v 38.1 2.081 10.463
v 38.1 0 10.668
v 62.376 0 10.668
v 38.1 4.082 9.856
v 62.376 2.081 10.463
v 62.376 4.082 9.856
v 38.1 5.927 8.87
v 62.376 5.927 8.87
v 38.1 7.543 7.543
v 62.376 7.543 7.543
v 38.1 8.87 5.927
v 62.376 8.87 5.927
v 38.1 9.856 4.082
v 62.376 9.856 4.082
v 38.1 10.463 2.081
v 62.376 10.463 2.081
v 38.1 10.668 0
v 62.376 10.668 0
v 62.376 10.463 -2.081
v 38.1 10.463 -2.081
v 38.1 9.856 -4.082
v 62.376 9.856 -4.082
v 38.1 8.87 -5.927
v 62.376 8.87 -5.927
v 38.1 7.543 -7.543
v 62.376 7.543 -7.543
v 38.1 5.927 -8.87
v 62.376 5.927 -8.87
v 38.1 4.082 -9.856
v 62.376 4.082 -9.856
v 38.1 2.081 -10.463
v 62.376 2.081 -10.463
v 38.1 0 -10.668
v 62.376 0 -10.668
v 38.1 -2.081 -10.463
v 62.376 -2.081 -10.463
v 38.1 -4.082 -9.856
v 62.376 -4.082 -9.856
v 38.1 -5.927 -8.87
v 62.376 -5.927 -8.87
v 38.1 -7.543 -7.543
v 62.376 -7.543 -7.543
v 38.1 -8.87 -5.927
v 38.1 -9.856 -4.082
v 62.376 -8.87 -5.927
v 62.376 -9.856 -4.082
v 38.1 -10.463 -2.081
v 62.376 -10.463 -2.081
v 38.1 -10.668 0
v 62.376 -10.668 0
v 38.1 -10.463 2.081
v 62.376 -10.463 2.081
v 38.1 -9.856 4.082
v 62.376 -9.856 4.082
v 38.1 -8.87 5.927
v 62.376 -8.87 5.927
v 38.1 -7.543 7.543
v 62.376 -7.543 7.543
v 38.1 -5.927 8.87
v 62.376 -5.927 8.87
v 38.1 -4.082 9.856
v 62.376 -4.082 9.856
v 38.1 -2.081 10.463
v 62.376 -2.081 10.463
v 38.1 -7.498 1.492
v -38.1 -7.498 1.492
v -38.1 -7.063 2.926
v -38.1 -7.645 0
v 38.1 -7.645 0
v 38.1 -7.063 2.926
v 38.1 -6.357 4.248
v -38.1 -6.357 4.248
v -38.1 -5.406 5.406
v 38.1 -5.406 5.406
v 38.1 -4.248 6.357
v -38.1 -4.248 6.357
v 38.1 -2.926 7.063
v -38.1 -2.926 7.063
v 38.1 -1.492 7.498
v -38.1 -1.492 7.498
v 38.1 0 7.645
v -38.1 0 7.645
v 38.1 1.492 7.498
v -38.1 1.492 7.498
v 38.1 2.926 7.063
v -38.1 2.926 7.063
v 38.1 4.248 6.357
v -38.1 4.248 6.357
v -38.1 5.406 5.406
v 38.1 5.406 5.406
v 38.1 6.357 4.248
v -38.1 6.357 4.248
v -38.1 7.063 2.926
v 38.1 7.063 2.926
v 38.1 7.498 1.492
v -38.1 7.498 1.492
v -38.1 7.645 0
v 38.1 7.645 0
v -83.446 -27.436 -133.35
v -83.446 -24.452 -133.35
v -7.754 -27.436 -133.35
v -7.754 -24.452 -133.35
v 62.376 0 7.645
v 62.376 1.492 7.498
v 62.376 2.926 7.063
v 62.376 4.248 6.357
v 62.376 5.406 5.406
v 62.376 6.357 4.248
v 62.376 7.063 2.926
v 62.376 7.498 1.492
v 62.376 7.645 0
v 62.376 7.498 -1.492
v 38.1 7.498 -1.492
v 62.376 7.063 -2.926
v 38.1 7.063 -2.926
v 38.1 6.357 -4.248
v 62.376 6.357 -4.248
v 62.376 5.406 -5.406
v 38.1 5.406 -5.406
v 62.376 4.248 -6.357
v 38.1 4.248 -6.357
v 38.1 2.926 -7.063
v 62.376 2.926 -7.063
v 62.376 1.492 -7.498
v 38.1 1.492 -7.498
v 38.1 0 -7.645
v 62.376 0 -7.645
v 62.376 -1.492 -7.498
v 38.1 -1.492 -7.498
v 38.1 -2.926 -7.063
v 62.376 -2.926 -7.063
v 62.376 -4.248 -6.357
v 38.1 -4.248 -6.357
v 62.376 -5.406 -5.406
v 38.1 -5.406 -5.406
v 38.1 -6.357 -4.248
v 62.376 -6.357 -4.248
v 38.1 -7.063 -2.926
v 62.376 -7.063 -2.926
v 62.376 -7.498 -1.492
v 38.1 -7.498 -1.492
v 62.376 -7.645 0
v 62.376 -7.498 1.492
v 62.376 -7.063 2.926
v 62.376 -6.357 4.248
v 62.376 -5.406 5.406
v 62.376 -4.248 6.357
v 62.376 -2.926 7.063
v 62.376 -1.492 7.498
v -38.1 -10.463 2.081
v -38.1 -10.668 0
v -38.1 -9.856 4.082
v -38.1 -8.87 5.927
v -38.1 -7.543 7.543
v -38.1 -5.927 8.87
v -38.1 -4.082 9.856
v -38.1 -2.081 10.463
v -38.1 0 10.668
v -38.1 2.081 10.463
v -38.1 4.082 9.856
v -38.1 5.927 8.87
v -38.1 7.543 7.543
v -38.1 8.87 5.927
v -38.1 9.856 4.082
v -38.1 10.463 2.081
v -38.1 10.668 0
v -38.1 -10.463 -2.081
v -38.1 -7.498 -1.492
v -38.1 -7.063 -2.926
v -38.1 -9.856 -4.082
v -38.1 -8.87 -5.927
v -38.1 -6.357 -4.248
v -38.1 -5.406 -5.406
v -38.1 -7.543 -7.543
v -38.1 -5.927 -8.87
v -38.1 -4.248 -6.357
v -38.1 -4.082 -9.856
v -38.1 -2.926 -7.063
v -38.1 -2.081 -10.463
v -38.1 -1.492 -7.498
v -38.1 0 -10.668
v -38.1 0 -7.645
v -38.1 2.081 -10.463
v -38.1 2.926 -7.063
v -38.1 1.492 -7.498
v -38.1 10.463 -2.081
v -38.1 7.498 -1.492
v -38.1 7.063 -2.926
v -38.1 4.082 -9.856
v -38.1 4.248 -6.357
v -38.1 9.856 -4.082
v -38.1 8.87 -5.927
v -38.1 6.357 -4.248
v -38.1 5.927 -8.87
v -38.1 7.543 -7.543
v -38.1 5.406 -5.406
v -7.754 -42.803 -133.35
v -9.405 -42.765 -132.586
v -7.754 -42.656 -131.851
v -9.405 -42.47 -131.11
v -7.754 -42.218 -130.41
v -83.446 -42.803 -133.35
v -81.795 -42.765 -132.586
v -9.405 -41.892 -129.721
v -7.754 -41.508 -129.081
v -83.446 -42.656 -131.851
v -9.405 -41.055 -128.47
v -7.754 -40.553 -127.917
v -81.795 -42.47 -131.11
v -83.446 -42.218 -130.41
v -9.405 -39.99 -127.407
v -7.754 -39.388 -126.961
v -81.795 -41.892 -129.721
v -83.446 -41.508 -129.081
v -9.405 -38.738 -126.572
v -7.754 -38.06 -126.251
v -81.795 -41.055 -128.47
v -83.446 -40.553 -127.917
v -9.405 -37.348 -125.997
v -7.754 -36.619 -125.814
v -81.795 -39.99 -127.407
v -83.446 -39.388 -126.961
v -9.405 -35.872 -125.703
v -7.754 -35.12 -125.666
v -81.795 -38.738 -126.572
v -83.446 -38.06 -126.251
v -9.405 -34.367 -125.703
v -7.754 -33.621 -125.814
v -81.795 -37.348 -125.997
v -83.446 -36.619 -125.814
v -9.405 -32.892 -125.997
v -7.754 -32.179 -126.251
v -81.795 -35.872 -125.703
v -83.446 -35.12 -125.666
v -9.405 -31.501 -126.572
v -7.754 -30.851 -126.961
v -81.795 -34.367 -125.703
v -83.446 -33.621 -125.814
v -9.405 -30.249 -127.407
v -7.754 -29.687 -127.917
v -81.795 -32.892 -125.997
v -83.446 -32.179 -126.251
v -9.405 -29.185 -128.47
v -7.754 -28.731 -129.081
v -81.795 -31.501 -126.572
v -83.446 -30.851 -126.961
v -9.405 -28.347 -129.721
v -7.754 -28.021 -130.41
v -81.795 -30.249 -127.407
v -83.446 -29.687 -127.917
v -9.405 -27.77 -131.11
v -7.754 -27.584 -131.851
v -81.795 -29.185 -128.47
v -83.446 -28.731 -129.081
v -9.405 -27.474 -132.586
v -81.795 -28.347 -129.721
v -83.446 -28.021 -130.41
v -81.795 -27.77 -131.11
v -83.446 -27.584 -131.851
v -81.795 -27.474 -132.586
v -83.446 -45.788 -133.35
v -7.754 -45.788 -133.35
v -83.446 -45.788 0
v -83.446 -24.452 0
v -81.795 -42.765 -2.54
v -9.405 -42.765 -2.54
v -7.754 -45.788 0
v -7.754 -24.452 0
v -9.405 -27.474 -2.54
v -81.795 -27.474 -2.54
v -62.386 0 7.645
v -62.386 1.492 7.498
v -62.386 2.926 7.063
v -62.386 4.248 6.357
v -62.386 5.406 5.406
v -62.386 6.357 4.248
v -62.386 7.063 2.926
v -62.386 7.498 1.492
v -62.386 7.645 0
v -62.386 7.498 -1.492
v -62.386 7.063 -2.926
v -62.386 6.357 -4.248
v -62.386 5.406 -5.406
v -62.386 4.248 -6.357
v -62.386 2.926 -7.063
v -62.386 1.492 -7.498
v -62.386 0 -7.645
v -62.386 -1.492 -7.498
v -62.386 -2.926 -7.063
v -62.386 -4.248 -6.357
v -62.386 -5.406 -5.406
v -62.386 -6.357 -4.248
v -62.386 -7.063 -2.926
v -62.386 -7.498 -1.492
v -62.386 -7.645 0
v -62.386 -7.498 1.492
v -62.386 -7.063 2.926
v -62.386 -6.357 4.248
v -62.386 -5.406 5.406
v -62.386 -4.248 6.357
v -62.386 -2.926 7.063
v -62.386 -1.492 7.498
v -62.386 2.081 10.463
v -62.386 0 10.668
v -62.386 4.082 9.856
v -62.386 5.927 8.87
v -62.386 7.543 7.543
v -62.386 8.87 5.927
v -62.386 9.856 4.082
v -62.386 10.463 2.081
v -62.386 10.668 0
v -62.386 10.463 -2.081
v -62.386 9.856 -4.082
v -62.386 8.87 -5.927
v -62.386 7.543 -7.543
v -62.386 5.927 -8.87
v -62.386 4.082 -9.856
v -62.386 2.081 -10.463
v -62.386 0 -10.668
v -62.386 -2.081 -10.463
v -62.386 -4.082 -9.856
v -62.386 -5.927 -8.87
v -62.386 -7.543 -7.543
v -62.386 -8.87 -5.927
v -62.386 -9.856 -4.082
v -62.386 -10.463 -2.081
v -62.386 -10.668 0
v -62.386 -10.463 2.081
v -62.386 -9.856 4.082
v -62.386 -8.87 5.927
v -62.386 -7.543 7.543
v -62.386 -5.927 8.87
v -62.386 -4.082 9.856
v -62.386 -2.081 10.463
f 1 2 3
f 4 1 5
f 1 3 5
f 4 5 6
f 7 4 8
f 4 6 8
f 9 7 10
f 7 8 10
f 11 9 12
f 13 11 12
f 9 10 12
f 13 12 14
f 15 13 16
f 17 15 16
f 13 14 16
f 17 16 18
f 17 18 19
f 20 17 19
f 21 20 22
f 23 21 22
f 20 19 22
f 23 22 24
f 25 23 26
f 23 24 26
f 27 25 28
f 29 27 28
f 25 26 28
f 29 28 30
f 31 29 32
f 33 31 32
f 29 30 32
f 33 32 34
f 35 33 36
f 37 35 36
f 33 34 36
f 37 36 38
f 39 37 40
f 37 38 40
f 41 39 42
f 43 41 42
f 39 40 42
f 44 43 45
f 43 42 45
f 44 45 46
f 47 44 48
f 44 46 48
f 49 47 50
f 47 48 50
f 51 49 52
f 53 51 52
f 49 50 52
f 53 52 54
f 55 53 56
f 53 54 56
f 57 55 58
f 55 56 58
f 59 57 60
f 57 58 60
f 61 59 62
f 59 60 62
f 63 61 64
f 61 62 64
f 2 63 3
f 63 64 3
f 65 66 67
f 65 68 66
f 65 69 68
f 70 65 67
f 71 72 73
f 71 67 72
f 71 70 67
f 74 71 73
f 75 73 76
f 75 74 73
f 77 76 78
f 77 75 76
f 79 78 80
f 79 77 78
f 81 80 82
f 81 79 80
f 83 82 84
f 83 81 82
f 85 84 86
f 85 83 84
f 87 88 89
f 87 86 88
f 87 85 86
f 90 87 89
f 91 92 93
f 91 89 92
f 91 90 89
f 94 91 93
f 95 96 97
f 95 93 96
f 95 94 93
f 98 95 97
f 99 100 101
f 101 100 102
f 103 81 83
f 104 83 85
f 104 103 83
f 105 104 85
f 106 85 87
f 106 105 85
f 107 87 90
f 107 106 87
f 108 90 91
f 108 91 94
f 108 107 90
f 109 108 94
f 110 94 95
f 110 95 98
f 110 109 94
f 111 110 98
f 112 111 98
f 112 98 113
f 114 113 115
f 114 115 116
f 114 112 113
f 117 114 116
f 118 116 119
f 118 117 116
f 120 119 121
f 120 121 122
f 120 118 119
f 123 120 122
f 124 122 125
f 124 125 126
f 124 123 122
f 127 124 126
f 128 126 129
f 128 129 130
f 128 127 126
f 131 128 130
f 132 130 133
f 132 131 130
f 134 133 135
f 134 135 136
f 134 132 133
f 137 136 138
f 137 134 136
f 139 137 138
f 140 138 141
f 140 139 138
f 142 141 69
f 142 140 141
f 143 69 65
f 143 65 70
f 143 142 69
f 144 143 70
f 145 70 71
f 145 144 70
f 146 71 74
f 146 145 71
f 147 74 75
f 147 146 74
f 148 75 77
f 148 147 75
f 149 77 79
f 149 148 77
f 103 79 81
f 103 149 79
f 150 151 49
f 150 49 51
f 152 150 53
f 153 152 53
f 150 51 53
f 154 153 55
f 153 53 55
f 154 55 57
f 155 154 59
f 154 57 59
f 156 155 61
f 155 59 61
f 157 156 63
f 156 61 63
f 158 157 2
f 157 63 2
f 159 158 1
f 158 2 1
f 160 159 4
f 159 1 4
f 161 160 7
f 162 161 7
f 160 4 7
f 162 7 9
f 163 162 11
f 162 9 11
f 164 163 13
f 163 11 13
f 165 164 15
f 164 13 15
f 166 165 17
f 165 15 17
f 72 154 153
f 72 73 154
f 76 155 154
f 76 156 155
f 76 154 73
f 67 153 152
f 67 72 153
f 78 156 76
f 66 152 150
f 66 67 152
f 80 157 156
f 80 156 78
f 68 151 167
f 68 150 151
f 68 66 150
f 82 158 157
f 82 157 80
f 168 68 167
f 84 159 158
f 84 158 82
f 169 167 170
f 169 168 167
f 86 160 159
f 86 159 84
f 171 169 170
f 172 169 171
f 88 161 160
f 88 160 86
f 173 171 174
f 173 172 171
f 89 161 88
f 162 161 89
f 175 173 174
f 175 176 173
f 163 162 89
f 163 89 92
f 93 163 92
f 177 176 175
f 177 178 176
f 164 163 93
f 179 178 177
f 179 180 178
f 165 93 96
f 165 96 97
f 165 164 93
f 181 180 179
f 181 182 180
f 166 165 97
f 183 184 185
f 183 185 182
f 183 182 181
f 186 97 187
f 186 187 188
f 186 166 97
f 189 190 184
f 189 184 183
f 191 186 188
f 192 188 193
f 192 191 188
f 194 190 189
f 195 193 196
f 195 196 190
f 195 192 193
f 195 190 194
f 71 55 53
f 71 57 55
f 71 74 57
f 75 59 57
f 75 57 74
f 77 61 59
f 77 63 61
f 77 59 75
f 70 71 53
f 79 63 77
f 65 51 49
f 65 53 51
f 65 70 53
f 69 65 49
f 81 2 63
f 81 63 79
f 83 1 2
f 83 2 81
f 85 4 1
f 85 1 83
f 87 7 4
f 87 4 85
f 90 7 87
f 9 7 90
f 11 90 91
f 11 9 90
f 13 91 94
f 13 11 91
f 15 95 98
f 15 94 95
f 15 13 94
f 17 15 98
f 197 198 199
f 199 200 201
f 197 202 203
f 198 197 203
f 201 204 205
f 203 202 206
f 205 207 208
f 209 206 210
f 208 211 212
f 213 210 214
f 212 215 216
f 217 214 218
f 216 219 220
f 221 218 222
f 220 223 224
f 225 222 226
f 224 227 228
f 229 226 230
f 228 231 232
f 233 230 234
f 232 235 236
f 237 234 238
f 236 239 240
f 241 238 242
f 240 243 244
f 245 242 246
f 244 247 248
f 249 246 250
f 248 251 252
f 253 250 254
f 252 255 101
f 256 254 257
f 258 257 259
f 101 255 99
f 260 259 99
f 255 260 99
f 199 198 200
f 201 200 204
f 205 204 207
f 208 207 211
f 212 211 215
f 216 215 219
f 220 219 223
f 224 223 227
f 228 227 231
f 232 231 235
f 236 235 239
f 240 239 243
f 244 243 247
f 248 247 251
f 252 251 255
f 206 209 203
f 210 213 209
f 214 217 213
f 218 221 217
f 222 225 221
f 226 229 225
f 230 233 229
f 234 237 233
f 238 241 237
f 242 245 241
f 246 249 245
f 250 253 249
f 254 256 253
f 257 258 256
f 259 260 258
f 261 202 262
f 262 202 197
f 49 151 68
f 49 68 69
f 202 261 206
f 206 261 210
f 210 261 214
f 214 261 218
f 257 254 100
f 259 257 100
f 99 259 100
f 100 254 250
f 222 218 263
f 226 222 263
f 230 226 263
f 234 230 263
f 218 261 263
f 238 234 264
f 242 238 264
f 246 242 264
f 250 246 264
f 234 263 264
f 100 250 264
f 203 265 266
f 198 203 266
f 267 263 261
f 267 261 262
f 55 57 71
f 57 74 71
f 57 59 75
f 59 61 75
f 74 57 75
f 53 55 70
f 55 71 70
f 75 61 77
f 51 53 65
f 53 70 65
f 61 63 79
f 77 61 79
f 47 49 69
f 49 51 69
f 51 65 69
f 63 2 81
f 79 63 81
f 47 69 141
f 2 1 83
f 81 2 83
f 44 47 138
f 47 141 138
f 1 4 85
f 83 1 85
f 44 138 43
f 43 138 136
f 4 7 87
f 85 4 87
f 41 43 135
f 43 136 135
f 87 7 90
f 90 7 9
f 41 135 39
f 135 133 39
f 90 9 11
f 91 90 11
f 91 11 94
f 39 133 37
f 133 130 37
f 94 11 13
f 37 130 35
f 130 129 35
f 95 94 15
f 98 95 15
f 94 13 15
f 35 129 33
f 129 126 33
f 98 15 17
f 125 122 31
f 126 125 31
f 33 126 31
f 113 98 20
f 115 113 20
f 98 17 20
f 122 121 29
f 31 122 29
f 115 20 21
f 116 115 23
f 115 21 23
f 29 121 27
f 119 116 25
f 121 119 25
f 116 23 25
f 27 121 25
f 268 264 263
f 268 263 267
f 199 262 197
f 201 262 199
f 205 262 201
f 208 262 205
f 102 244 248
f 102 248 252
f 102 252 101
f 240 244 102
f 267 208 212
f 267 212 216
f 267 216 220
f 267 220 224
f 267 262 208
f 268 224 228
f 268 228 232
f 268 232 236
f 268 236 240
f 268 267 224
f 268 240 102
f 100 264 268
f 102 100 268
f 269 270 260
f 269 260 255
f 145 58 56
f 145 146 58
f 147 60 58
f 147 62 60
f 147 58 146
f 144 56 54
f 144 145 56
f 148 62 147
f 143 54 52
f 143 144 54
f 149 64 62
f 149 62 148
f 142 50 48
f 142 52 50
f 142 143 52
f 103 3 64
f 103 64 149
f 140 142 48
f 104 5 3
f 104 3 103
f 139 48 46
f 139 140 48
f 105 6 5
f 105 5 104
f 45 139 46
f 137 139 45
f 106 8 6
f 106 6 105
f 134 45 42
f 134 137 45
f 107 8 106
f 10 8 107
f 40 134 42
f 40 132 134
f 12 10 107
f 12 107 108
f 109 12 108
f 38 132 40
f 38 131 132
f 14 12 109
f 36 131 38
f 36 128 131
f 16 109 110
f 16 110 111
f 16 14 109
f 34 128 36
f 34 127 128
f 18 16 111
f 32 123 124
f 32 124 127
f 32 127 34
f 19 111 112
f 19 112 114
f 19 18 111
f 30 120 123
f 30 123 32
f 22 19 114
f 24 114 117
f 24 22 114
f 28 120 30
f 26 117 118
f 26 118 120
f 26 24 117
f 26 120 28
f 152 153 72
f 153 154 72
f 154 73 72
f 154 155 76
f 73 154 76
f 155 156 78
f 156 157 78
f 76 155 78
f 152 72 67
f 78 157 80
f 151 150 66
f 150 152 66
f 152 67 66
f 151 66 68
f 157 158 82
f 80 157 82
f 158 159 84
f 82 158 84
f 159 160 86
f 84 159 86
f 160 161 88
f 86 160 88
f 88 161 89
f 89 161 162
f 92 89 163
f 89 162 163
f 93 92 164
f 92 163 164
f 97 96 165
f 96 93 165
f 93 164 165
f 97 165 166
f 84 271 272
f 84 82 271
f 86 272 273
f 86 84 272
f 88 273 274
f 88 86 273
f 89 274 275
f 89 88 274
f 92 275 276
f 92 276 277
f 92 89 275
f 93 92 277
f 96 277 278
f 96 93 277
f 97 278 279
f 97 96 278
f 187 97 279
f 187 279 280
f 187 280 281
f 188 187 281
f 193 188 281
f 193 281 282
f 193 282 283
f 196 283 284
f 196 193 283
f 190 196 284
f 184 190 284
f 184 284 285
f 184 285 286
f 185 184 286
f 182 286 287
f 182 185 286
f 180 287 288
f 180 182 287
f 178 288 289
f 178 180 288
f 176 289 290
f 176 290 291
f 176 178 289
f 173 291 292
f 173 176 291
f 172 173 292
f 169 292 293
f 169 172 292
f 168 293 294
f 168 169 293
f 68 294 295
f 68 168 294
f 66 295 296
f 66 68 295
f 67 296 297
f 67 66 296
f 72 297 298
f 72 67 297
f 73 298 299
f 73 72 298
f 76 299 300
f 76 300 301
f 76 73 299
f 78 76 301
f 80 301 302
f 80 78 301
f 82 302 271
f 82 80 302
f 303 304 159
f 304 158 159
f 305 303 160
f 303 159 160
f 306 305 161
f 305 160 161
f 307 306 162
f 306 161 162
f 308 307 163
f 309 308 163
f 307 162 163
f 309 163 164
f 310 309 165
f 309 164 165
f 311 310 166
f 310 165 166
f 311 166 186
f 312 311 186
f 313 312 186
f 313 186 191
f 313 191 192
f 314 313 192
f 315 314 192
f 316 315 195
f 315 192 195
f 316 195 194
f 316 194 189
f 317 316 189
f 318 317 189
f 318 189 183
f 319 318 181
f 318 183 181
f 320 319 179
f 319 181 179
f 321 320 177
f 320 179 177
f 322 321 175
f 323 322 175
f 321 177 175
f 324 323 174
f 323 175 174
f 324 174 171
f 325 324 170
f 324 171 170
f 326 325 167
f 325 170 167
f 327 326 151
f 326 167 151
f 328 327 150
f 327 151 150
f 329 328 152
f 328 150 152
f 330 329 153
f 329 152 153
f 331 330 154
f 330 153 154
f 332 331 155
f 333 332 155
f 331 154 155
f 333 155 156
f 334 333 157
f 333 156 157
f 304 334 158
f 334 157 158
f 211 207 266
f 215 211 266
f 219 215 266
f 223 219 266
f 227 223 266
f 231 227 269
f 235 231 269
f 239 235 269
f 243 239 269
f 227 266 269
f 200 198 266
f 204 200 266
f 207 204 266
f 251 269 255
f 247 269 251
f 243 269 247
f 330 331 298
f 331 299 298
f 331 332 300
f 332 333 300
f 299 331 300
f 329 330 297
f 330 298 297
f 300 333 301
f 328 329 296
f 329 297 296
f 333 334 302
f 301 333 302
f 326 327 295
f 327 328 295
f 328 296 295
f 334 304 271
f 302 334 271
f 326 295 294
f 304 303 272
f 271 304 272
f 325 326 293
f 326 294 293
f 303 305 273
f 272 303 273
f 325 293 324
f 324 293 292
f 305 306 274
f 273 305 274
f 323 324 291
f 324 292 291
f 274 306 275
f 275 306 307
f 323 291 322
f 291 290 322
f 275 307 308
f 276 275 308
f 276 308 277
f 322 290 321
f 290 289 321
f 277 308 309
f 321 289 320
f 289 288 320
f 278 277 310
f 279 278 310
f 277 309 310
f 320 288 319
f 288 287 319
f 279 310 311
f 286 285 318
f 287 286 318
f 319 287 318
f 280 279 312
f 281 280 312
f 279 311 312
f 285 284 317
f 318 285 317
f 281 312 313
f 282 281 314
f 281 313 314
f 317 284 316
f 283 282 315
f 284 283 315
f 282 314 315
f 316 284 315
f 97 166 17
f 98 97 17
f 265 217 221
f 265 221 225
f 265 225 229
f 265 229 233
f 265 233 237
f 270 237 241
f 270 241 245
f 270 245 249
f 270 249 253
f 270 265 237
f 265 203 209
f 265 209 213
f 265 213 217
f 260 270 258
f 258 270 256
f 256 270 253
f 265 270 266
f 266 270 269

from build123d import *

# Parameters (mm, degrees)
F0_W     = 76.2
F0_H     = 3.0226
F1_ANGLE = 180
F2_W     = 24.275709
F2_H     = 3.0226
F2_W_2   = 24.285598
F4_W     = 75.692
F4_H     = 21.336
F4_W_2   = 72.39
F4_H_2   = 15.2908
F5_DEPTH = 133.35
F6_DEPTH = 2.54
F8_D     = 15.367


with BuildPart() as f1:
    # F0 (on Front) → F1 (revolve, symmetric)
    with BuildSketch(Plane.XZ) as f1_sk:
        with Locations((0, 9.1567)):
            Rectangle(F0_W, F0_H)
    revolve(axis=Axis((6.4693, 0, 0), (1, 0, 0)), revolution_arc=F1_ANGLE / 2)
    revolve(f1_sk.sketch, axis=Axis((6.4693, 0, 0), (-1, 0, 0)), revolution_arc=F1_ANGLE / 2)


with BuildPart() as f3:
    # F2 (on Front) → F3 (revolve)
    with BuildSketch(Plane.XZ):
        with Locations((50.237854, 9.1567)):
            Rectangle(F2_W, F2_H)
        with Locations((-50.242799, 9.1567)):
            Rectangle(F2_W_2, F2_H)
    revolve(axis=Axis((7.914741, 0, 0), (-1, 0, 0)))


with BuildPart() as f5:
    # F4 (on Top) → F5 (new body)
    with BuildSketch(Plane.XY):
        with Locations((-45.599519, -35.119774)):
            Rectangle(F4_W, F4_H)
        with Locations((-45.599519, -35.119774)):
            Rectangle(F4_W_2, F4_H_2, mode=Mode.SUBTRACT)
    extrude(amount=-F5_DEPTH)

    # F4 (on Top) → F6 (join)
    with BuildSketch(Plane.XY):
        with Locations((-45.599519, -35.119774)):
            Rectangle(F4_W_2, F4_H_2)
    extrude(amount=-F6_DEPTH)

    # F8 (through all)
    with Locations(Plane.YZ.offset(-7.753519)):
        with Locations((-35.119774, -133.35)):
            Hole(F8_D / 2)


solid = Compound([f1.part, f3.part, f5.part])
